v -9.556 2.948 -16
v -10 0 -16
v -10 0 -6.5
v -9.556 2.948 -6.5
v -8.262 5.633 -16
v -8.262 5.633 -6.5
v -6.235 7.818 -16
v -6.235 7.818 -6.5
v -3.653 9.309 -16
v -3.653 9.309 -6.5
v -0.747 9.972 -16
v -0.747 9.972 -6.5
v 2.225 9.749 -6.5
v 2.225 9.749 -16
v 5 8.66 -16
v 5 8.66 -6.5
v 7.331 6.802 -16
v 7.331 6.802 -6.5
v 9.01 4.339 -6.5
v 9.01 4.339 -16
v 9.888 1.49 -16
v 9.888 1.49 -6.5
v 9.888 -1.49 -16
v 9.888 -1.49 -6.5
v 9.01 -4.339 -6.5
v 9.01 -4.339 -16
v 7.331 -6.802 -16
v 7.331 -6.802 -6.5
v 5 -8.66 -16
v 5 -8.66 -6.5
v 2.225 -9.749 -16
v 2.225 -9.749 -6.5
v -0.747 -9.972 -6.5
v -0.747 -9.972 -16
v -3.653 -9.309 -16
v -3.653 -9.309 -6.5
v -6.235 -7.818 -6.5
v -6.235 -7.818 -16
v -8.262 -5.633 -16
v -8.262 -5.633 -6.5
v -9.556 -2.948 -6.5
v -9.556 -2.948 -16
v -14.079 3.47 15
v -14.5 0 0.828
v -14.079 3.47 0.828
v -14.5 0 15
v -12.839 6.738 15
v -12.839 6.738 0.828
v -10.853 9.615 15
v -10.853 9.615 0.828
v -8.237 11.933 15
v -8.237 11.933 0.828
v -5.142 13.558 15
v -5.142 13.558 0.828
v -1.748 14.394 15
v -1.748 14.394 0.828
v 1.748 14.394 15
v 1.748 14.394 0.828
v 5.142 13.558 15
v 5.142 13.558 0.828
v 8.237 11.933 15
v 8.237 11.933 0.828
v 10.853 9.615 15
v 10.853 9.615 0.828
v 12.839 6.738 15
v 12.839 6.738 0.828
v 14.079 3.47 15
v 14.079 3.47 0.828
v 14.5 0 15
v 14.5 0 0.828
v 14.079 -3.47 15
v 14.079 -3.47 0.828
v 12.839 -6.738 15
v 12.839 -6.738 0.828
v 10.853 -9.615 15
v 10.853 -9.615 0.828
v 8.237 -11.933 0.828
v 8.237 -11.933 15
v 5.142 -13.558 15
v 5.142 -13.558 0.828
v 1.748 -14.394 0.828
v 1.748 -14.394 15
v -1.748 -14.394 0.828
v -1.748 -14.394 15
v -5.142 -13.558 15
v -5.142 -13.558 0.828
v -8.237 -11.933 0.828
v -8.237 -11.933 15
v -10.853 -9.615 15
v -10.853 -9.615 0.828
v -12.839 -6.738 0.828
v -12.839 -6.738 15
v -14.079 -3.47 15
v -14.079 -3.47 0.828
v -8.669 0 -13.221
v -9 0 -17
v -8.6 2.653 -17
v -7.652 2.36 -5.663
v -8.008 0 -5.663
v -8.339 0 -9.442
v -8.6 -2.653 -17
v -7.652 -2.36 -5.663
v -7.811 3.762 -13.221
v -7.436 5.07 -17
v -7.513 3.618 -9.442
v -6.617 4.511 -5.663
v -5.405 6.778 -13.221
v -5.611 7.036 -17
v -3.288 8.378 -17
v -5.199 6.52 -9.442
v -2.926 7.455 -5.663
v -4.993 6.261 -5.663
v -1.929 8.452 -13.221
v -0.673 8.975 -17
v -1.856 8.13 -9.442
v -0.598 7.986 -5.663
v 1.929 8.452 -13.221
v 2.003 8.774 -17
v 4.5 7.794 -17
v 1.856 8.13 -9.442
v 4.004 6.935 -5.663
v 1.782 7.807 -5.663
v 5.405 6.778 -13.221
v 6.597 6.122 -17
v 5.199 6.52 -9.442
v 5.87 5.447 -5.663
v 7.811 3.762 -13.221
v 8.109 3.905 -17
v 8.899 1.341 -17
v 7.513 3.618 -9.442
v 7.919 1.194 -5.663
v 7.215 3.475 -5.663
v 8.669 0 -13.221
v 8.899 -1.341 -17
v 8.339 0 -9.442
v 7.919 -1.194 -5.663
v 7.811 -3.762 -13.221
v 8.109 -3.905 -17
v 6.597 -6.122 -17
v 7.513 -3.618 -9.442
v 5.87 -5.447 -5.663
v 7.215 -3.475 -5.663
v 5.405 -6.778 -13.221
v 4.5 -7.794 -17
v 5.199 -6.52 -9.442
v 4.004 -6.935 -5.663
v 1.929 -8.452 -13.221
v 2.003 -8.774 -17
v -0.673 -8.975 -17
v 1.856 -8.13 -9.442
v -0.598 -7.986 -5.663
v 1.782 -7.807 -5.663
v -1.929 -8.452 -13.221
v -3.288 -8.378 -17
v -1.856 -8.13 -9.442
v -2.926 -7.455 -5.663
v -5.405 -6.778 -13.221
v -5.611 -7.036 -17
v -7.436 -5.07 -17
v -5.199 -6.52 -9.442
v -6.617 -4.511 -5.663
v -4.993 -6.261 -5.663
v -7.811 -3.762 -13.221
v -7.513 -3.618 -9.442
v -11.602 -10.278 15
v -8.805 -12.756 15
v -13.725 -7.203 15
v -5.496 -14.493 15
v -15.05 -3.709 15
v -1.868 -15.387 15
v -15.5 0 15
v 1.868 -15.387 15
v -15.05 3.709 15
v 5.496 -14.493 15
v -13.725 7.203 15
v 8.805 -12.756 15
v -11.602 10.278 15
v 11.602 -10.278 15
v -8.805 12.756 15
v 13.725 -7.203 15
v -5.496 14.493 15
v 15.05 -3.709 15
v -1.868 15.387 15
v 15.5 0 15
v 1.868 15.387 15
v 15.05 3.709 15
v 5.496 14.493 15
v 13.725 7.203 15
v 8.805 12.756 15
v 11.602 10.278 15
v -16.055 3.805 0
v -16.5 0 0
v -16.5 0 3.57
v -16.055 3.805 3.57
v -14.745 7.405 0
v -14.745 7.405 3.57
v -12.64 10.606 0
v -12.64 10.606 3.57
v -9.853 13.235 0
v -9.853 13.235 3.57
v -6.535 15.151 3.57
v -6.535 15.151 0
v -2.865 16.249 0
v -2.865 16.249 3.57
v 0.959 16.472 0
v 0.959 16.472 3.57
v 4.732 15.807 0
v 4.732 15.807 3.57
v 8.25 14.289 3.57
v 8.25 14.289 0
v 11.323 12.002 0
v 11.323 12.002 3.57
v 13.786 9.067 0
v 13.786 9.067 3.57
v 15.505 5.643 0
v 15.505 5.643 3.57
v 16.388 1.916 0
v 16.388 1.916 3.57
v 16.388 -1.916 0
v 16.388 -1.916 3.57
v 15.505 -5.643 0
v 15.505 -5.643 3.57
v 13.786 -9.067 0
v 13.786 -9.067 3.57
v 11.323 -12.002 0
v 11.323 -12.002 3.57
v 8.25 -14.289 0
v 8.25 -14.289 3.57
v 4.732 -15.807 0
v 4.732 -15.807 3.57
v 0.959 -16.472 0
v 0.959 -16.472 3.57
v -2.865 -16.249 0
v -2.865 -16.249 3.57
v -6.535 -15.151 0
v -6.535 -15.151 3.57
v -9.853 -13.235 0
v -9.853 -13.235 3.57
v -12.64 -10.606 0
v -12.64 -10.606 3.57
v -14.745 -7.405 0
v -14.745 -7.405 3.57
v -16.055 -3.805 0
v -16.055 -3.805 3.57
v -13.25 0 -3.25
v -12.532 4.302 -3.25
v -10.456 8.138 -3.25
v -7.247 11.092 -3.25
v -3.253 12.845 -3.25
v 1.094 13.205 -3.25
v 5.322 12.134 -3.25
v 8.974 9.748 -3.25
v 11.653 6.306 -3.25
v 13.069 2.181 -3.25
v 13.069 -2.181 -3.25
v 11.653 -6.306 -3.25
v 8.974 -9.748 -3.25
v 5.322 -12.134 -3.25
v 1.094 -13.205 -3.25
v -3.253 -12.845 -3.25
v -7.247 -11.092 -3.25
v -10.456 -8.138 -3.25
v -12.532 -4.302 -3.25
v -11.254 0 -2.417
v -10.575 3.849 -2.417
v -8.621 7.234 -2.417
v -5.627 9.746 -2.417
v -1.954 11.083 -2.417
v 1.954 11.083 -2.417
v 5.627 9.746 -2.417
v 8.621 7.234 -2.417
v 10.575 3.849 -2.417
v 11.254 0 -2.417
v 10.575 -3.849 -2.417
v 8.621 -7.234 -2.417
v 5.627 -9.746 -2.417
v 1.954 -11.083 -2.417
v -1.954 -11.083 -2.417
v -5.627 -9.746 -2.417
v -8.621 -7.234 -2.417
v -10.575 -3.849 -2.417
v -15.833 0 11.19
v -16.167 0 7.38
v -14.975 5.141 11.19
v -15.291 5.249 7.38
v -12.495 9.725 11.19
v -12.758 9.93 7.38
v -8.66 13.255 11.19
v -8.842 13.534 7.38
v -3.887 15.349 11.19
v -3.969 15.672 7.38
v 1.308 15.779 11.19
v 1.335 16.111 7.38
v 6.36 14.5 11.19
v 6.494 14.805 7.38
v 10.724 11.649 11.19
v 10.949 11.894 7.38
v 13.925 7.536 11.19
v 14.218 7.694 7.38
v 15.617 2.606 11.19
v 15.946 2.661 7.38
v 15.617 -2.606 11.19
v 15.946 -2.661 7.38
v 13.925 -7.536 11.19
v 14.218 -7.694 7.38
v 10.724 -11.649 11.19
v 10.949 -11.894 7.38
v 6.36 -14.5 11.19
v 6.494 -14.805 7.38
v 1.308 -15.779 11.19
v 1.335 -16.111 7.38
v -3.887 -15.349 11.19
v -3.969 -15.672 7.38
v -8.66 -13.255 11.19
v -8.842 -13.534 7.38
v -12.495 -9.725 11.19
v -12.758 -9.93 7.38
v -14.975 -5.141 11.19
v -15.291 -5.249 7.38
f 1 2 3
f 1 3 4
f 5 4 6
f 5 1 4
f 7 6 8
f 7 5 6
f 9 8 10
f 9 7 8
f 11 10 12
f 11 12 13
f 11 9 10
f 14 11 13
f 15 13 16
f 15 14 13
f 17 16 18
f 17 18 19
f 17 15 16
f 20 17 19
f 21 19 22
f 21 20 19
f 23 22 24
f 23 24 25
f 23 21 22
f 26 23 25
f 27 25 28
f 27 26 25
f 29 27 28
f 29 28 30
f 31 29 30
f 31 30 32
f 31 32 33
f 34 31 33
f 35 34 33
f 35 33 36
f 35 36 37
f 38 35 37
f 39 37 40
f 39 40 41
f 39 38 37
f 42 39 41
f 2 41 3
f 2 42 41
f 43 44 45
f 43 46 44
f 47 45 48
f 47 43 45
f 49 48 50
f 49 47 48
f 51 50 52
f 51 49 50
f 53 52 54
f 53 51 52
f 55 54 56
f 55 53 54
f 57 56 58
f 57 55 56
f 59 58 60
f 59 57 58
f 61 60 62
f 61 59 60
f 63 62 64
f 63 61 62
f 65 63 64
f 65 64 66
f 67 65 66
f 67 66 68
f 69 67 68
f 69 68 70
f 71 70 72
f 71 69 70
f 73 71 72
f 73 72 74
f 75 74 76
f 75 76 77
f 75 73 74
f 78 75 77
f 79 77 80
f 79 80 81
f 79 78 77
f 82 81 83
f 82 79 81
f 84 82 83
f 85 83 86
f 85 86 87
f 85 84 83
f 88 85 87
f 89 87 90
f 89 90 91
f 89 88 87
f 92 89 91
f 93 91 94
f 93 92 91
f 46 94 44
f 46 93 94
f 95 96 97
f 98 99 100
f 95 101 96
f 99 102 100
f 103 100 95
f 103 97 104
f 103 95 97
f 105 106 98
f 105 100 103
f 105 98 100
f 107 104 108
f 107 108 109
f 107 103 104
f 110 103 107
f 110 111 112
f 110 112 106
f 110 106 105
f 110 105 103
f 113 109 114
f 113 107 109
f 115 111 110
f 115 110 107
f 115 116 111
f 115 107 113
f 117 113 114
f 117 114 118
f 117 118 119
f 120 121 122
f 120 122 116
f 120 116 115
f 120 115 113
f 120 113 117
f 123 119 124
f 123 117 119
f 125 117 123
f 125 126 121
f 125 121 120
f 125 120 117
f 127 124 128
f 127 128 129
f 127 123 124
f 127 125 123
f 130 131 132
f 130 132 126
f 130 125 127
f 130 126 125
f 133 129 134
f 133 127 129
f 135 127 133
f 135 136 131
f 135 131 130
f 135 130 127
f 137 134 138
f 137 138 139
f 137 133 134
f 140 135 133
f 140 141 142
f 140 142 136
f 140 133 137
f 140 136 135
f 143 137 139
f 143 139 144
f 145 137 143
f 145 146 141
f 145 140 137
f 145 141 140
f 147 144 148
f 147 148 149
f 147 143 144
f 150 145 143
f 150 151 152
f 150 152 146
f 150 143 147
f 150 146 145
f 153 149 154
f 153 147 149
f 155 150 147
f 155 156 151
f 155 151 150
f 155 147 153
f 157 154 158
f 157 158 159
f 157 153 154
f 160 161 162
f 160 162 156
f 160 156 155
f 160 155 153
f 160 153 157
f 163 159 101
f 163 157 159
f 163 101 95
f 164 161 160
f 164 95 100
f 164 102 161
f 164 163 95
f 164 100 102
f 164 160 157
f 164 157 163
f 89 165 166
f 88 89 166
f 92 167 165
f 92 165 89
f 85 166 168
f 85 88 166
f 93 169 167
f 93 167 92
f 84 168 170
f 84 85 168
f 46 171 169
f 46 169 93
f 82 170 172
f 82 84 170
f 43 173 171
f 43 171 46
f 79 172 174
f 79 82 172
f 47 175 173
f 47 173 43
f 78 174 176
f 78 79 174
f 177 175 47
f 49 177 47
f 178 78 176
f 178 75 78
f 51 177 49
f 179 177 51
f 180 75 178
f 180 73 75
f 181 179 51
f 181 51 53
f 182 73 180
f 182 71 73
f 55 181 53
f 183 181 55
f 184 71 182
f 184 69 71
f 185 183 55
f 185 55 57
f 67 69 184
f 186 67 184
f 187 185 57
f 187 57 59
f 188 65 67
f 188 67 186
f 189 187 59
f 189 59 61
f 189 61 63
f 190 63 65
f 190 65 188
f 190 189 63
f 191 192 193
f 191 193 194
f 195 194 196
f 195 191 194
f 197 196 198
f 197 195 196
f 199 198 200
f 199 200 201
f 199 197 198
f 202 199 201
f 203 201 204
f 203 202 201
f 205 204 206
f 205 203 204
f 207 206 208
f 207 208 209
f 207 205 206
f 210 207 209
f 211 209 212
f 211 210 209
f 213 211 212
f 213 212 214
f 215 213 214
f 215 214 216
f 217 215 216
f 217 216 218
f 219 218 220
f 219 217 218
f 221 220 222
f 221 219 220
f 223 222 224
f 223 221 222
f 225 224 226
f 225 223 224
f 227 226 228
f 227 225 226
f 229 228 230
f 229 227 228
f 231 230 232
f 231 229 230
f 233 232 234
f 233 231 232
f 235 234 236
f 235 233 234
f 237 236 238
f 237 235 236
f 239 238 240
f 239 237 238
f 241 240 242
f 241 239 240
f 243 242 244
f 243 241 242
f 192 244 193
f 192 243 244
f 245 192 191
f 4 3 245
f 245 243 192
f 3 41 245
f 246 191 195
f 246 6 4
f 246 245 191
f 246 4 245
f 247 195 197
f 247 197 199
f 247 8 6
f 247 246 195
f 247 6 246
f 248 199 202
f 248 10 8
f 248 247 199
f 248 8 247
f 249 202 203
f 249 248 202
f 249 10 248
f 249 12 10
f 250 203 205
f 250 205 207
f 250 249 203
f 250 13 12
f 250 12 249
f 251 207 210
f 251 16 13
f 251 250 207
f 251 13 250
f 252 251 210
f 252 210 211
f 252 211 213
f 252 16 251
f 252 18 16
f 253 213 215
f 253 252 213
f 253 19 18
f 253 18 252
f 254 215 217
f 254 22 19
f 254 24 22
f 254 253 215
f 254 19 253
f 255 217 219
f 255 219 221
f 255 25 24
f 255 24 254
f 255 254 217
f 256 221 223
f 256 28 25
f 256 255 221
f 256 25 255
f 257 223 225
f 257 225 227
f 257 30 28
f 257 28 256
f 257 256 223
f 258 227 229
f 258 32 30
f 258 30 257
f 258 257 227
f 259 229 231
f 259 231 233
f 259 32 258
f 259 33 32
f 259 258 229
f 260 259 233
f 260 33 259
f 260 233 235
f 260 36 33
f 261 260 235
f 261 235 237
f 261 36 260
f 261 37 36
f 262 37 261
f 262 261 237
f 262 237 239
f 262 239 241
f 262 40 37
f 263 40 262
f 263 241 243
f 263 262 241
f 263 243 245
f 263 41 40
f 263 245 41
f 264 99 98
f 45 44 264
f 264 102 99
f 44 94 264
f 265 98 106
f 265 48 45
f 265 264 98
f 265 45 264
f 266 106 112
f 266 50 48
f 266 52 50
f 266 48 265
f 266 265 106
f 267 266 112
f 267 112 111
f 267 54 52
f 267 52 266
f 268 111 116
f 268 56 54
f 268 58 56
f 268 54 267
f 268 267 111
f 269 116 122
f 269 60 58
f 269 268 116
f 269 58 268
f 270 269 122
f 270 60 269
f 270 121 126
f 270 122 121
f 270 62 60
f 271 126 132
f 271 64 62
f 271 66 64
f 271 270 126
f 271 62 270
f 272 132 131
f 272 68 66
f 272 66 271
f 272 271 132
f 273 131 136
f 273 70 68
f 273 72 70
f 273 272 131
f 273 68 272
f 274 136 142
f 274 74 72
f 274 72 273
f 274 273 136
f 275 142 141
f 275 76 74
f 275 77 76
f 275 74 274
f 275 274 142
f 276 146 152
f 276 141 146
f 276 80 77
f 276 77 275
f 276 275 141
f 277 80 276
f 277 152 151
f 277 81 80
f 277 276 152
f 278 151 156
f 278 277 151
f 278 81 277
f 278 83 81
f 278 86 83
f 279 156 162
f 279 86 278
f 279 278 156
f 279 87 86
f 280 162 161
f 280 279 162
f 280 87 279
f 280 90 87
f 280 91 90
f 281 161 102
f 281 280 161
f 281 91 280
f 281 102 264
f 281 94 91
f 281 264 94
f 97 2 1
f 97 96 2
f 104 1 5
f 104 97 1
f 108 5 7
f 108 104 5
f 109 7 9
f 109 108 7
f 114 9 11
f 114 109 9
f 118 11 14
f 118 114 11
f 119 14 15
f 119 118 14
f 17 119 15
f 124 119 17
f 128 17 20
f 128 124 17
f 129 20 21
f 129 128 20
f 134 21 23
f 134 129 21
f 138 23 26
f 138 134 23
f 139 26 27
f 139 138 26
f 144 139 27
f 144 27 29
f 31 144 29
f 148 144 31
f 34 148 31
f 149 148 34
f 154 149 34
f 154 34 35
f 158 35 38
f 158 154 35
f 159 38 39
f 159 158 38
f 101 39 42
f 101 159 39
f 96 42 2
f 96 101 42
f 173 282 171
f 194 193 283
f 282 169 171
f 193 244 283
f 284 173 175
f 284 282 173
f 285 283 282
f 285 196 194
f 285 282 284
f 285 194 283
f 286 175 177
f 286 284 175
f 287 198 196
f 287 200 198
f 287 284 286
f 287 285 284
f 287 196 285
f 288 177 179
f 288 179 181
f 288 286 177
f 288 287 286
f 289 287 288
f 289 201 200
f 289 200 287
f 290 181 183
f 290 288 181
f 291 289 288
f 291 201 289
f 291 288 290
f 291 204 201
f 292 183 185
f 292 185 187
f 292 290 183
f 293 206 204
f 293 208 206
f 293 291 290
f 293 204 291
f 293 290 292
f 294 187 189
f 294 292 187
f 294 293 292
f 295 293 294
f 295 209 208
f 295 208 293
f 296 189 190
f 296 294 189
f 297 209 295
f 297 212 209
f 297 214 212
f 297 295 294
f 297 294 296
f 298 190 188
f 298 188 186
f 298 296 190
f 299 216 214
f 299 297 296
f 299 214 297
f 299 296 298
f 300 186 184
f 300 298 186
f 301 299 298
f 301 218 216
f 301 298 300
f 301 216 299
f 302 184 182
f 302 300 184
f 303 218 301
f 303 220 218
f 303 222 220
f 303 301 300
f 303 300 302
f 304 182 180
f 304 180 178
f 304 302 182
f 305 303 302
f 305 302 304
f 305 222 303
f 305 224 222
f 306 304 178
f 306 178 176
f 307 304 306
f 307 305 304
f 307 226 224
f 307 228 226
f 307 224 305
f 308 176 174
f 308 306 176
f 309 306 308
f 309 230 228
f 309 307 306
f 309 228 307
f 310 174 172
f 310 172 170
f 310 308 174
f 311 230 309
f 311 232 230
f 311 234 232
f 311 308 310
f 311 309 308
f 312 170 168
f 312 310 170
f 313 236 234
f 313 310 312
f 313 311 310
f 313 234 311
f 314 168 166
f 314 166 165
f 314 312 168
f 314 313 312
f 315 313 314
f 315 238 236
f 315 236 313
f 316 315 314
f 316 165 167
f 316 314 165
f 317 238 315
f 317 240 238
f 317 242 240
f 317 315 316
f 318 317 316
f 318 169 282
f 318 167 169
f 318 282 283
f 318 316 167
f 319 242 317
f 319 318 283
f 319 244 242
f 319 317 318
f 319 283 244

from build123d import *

# Parameters (mm, degrees)
F2_SIZE2 = 11.4300523028
F2_SIZE  = 1
F3_SIZE  = 1


# Not quite as in the source:
# - a fillet or chamfer that OpenCascade refuses, or shapes differently, is made with other operations: its cross-section is extruded or revolved along the edge and cut away or added


with BuildPart() as f1:
    # F0 (on Front) → F1 (revolve)
    with BuildSketch(Plane.XZ):
        Polygon((-14.5, 15), (-16.5, 15), (-16.5, 0), (-10, -6.5), (-10, -17), (-8, -17), (-8, -5.6715728753), (-14.5, 0.8284271247), align=None)
    revolve(axis=Axis((0, 0, 0.14814813), (0, 0, -1)))

    # F2
    f2_edges = [f1.edges().sort_by_distance(p)[0] for p in [
        (16.5, 0, 15),
    ]]
    chamfer(f2_edges, length=F2_SIZE, length2=F2_SIZE2)

    # F3
    f3_edges = [f1.edges().sort_by_distance(p)[0] for p in [
        (10, 0, -17),
    ]]
    chamfer(f3_edges, length=F3_SIZE)

    # F4: chamfer of 1 x 11.4300523028 on 1 edges, made by hand

    # F4_s1 → F4_t2 (revolve, cut)
    with BuildSketch(Plane.XZ):
        Polygon((-9, -17), (-8, -5.5699476972), (-8, -17), align=None)
    revolve(axis=Axis((0, 0, -17), (0, 0, -1)), mode=Mode.SUBTRACT)


solid = f1.part
